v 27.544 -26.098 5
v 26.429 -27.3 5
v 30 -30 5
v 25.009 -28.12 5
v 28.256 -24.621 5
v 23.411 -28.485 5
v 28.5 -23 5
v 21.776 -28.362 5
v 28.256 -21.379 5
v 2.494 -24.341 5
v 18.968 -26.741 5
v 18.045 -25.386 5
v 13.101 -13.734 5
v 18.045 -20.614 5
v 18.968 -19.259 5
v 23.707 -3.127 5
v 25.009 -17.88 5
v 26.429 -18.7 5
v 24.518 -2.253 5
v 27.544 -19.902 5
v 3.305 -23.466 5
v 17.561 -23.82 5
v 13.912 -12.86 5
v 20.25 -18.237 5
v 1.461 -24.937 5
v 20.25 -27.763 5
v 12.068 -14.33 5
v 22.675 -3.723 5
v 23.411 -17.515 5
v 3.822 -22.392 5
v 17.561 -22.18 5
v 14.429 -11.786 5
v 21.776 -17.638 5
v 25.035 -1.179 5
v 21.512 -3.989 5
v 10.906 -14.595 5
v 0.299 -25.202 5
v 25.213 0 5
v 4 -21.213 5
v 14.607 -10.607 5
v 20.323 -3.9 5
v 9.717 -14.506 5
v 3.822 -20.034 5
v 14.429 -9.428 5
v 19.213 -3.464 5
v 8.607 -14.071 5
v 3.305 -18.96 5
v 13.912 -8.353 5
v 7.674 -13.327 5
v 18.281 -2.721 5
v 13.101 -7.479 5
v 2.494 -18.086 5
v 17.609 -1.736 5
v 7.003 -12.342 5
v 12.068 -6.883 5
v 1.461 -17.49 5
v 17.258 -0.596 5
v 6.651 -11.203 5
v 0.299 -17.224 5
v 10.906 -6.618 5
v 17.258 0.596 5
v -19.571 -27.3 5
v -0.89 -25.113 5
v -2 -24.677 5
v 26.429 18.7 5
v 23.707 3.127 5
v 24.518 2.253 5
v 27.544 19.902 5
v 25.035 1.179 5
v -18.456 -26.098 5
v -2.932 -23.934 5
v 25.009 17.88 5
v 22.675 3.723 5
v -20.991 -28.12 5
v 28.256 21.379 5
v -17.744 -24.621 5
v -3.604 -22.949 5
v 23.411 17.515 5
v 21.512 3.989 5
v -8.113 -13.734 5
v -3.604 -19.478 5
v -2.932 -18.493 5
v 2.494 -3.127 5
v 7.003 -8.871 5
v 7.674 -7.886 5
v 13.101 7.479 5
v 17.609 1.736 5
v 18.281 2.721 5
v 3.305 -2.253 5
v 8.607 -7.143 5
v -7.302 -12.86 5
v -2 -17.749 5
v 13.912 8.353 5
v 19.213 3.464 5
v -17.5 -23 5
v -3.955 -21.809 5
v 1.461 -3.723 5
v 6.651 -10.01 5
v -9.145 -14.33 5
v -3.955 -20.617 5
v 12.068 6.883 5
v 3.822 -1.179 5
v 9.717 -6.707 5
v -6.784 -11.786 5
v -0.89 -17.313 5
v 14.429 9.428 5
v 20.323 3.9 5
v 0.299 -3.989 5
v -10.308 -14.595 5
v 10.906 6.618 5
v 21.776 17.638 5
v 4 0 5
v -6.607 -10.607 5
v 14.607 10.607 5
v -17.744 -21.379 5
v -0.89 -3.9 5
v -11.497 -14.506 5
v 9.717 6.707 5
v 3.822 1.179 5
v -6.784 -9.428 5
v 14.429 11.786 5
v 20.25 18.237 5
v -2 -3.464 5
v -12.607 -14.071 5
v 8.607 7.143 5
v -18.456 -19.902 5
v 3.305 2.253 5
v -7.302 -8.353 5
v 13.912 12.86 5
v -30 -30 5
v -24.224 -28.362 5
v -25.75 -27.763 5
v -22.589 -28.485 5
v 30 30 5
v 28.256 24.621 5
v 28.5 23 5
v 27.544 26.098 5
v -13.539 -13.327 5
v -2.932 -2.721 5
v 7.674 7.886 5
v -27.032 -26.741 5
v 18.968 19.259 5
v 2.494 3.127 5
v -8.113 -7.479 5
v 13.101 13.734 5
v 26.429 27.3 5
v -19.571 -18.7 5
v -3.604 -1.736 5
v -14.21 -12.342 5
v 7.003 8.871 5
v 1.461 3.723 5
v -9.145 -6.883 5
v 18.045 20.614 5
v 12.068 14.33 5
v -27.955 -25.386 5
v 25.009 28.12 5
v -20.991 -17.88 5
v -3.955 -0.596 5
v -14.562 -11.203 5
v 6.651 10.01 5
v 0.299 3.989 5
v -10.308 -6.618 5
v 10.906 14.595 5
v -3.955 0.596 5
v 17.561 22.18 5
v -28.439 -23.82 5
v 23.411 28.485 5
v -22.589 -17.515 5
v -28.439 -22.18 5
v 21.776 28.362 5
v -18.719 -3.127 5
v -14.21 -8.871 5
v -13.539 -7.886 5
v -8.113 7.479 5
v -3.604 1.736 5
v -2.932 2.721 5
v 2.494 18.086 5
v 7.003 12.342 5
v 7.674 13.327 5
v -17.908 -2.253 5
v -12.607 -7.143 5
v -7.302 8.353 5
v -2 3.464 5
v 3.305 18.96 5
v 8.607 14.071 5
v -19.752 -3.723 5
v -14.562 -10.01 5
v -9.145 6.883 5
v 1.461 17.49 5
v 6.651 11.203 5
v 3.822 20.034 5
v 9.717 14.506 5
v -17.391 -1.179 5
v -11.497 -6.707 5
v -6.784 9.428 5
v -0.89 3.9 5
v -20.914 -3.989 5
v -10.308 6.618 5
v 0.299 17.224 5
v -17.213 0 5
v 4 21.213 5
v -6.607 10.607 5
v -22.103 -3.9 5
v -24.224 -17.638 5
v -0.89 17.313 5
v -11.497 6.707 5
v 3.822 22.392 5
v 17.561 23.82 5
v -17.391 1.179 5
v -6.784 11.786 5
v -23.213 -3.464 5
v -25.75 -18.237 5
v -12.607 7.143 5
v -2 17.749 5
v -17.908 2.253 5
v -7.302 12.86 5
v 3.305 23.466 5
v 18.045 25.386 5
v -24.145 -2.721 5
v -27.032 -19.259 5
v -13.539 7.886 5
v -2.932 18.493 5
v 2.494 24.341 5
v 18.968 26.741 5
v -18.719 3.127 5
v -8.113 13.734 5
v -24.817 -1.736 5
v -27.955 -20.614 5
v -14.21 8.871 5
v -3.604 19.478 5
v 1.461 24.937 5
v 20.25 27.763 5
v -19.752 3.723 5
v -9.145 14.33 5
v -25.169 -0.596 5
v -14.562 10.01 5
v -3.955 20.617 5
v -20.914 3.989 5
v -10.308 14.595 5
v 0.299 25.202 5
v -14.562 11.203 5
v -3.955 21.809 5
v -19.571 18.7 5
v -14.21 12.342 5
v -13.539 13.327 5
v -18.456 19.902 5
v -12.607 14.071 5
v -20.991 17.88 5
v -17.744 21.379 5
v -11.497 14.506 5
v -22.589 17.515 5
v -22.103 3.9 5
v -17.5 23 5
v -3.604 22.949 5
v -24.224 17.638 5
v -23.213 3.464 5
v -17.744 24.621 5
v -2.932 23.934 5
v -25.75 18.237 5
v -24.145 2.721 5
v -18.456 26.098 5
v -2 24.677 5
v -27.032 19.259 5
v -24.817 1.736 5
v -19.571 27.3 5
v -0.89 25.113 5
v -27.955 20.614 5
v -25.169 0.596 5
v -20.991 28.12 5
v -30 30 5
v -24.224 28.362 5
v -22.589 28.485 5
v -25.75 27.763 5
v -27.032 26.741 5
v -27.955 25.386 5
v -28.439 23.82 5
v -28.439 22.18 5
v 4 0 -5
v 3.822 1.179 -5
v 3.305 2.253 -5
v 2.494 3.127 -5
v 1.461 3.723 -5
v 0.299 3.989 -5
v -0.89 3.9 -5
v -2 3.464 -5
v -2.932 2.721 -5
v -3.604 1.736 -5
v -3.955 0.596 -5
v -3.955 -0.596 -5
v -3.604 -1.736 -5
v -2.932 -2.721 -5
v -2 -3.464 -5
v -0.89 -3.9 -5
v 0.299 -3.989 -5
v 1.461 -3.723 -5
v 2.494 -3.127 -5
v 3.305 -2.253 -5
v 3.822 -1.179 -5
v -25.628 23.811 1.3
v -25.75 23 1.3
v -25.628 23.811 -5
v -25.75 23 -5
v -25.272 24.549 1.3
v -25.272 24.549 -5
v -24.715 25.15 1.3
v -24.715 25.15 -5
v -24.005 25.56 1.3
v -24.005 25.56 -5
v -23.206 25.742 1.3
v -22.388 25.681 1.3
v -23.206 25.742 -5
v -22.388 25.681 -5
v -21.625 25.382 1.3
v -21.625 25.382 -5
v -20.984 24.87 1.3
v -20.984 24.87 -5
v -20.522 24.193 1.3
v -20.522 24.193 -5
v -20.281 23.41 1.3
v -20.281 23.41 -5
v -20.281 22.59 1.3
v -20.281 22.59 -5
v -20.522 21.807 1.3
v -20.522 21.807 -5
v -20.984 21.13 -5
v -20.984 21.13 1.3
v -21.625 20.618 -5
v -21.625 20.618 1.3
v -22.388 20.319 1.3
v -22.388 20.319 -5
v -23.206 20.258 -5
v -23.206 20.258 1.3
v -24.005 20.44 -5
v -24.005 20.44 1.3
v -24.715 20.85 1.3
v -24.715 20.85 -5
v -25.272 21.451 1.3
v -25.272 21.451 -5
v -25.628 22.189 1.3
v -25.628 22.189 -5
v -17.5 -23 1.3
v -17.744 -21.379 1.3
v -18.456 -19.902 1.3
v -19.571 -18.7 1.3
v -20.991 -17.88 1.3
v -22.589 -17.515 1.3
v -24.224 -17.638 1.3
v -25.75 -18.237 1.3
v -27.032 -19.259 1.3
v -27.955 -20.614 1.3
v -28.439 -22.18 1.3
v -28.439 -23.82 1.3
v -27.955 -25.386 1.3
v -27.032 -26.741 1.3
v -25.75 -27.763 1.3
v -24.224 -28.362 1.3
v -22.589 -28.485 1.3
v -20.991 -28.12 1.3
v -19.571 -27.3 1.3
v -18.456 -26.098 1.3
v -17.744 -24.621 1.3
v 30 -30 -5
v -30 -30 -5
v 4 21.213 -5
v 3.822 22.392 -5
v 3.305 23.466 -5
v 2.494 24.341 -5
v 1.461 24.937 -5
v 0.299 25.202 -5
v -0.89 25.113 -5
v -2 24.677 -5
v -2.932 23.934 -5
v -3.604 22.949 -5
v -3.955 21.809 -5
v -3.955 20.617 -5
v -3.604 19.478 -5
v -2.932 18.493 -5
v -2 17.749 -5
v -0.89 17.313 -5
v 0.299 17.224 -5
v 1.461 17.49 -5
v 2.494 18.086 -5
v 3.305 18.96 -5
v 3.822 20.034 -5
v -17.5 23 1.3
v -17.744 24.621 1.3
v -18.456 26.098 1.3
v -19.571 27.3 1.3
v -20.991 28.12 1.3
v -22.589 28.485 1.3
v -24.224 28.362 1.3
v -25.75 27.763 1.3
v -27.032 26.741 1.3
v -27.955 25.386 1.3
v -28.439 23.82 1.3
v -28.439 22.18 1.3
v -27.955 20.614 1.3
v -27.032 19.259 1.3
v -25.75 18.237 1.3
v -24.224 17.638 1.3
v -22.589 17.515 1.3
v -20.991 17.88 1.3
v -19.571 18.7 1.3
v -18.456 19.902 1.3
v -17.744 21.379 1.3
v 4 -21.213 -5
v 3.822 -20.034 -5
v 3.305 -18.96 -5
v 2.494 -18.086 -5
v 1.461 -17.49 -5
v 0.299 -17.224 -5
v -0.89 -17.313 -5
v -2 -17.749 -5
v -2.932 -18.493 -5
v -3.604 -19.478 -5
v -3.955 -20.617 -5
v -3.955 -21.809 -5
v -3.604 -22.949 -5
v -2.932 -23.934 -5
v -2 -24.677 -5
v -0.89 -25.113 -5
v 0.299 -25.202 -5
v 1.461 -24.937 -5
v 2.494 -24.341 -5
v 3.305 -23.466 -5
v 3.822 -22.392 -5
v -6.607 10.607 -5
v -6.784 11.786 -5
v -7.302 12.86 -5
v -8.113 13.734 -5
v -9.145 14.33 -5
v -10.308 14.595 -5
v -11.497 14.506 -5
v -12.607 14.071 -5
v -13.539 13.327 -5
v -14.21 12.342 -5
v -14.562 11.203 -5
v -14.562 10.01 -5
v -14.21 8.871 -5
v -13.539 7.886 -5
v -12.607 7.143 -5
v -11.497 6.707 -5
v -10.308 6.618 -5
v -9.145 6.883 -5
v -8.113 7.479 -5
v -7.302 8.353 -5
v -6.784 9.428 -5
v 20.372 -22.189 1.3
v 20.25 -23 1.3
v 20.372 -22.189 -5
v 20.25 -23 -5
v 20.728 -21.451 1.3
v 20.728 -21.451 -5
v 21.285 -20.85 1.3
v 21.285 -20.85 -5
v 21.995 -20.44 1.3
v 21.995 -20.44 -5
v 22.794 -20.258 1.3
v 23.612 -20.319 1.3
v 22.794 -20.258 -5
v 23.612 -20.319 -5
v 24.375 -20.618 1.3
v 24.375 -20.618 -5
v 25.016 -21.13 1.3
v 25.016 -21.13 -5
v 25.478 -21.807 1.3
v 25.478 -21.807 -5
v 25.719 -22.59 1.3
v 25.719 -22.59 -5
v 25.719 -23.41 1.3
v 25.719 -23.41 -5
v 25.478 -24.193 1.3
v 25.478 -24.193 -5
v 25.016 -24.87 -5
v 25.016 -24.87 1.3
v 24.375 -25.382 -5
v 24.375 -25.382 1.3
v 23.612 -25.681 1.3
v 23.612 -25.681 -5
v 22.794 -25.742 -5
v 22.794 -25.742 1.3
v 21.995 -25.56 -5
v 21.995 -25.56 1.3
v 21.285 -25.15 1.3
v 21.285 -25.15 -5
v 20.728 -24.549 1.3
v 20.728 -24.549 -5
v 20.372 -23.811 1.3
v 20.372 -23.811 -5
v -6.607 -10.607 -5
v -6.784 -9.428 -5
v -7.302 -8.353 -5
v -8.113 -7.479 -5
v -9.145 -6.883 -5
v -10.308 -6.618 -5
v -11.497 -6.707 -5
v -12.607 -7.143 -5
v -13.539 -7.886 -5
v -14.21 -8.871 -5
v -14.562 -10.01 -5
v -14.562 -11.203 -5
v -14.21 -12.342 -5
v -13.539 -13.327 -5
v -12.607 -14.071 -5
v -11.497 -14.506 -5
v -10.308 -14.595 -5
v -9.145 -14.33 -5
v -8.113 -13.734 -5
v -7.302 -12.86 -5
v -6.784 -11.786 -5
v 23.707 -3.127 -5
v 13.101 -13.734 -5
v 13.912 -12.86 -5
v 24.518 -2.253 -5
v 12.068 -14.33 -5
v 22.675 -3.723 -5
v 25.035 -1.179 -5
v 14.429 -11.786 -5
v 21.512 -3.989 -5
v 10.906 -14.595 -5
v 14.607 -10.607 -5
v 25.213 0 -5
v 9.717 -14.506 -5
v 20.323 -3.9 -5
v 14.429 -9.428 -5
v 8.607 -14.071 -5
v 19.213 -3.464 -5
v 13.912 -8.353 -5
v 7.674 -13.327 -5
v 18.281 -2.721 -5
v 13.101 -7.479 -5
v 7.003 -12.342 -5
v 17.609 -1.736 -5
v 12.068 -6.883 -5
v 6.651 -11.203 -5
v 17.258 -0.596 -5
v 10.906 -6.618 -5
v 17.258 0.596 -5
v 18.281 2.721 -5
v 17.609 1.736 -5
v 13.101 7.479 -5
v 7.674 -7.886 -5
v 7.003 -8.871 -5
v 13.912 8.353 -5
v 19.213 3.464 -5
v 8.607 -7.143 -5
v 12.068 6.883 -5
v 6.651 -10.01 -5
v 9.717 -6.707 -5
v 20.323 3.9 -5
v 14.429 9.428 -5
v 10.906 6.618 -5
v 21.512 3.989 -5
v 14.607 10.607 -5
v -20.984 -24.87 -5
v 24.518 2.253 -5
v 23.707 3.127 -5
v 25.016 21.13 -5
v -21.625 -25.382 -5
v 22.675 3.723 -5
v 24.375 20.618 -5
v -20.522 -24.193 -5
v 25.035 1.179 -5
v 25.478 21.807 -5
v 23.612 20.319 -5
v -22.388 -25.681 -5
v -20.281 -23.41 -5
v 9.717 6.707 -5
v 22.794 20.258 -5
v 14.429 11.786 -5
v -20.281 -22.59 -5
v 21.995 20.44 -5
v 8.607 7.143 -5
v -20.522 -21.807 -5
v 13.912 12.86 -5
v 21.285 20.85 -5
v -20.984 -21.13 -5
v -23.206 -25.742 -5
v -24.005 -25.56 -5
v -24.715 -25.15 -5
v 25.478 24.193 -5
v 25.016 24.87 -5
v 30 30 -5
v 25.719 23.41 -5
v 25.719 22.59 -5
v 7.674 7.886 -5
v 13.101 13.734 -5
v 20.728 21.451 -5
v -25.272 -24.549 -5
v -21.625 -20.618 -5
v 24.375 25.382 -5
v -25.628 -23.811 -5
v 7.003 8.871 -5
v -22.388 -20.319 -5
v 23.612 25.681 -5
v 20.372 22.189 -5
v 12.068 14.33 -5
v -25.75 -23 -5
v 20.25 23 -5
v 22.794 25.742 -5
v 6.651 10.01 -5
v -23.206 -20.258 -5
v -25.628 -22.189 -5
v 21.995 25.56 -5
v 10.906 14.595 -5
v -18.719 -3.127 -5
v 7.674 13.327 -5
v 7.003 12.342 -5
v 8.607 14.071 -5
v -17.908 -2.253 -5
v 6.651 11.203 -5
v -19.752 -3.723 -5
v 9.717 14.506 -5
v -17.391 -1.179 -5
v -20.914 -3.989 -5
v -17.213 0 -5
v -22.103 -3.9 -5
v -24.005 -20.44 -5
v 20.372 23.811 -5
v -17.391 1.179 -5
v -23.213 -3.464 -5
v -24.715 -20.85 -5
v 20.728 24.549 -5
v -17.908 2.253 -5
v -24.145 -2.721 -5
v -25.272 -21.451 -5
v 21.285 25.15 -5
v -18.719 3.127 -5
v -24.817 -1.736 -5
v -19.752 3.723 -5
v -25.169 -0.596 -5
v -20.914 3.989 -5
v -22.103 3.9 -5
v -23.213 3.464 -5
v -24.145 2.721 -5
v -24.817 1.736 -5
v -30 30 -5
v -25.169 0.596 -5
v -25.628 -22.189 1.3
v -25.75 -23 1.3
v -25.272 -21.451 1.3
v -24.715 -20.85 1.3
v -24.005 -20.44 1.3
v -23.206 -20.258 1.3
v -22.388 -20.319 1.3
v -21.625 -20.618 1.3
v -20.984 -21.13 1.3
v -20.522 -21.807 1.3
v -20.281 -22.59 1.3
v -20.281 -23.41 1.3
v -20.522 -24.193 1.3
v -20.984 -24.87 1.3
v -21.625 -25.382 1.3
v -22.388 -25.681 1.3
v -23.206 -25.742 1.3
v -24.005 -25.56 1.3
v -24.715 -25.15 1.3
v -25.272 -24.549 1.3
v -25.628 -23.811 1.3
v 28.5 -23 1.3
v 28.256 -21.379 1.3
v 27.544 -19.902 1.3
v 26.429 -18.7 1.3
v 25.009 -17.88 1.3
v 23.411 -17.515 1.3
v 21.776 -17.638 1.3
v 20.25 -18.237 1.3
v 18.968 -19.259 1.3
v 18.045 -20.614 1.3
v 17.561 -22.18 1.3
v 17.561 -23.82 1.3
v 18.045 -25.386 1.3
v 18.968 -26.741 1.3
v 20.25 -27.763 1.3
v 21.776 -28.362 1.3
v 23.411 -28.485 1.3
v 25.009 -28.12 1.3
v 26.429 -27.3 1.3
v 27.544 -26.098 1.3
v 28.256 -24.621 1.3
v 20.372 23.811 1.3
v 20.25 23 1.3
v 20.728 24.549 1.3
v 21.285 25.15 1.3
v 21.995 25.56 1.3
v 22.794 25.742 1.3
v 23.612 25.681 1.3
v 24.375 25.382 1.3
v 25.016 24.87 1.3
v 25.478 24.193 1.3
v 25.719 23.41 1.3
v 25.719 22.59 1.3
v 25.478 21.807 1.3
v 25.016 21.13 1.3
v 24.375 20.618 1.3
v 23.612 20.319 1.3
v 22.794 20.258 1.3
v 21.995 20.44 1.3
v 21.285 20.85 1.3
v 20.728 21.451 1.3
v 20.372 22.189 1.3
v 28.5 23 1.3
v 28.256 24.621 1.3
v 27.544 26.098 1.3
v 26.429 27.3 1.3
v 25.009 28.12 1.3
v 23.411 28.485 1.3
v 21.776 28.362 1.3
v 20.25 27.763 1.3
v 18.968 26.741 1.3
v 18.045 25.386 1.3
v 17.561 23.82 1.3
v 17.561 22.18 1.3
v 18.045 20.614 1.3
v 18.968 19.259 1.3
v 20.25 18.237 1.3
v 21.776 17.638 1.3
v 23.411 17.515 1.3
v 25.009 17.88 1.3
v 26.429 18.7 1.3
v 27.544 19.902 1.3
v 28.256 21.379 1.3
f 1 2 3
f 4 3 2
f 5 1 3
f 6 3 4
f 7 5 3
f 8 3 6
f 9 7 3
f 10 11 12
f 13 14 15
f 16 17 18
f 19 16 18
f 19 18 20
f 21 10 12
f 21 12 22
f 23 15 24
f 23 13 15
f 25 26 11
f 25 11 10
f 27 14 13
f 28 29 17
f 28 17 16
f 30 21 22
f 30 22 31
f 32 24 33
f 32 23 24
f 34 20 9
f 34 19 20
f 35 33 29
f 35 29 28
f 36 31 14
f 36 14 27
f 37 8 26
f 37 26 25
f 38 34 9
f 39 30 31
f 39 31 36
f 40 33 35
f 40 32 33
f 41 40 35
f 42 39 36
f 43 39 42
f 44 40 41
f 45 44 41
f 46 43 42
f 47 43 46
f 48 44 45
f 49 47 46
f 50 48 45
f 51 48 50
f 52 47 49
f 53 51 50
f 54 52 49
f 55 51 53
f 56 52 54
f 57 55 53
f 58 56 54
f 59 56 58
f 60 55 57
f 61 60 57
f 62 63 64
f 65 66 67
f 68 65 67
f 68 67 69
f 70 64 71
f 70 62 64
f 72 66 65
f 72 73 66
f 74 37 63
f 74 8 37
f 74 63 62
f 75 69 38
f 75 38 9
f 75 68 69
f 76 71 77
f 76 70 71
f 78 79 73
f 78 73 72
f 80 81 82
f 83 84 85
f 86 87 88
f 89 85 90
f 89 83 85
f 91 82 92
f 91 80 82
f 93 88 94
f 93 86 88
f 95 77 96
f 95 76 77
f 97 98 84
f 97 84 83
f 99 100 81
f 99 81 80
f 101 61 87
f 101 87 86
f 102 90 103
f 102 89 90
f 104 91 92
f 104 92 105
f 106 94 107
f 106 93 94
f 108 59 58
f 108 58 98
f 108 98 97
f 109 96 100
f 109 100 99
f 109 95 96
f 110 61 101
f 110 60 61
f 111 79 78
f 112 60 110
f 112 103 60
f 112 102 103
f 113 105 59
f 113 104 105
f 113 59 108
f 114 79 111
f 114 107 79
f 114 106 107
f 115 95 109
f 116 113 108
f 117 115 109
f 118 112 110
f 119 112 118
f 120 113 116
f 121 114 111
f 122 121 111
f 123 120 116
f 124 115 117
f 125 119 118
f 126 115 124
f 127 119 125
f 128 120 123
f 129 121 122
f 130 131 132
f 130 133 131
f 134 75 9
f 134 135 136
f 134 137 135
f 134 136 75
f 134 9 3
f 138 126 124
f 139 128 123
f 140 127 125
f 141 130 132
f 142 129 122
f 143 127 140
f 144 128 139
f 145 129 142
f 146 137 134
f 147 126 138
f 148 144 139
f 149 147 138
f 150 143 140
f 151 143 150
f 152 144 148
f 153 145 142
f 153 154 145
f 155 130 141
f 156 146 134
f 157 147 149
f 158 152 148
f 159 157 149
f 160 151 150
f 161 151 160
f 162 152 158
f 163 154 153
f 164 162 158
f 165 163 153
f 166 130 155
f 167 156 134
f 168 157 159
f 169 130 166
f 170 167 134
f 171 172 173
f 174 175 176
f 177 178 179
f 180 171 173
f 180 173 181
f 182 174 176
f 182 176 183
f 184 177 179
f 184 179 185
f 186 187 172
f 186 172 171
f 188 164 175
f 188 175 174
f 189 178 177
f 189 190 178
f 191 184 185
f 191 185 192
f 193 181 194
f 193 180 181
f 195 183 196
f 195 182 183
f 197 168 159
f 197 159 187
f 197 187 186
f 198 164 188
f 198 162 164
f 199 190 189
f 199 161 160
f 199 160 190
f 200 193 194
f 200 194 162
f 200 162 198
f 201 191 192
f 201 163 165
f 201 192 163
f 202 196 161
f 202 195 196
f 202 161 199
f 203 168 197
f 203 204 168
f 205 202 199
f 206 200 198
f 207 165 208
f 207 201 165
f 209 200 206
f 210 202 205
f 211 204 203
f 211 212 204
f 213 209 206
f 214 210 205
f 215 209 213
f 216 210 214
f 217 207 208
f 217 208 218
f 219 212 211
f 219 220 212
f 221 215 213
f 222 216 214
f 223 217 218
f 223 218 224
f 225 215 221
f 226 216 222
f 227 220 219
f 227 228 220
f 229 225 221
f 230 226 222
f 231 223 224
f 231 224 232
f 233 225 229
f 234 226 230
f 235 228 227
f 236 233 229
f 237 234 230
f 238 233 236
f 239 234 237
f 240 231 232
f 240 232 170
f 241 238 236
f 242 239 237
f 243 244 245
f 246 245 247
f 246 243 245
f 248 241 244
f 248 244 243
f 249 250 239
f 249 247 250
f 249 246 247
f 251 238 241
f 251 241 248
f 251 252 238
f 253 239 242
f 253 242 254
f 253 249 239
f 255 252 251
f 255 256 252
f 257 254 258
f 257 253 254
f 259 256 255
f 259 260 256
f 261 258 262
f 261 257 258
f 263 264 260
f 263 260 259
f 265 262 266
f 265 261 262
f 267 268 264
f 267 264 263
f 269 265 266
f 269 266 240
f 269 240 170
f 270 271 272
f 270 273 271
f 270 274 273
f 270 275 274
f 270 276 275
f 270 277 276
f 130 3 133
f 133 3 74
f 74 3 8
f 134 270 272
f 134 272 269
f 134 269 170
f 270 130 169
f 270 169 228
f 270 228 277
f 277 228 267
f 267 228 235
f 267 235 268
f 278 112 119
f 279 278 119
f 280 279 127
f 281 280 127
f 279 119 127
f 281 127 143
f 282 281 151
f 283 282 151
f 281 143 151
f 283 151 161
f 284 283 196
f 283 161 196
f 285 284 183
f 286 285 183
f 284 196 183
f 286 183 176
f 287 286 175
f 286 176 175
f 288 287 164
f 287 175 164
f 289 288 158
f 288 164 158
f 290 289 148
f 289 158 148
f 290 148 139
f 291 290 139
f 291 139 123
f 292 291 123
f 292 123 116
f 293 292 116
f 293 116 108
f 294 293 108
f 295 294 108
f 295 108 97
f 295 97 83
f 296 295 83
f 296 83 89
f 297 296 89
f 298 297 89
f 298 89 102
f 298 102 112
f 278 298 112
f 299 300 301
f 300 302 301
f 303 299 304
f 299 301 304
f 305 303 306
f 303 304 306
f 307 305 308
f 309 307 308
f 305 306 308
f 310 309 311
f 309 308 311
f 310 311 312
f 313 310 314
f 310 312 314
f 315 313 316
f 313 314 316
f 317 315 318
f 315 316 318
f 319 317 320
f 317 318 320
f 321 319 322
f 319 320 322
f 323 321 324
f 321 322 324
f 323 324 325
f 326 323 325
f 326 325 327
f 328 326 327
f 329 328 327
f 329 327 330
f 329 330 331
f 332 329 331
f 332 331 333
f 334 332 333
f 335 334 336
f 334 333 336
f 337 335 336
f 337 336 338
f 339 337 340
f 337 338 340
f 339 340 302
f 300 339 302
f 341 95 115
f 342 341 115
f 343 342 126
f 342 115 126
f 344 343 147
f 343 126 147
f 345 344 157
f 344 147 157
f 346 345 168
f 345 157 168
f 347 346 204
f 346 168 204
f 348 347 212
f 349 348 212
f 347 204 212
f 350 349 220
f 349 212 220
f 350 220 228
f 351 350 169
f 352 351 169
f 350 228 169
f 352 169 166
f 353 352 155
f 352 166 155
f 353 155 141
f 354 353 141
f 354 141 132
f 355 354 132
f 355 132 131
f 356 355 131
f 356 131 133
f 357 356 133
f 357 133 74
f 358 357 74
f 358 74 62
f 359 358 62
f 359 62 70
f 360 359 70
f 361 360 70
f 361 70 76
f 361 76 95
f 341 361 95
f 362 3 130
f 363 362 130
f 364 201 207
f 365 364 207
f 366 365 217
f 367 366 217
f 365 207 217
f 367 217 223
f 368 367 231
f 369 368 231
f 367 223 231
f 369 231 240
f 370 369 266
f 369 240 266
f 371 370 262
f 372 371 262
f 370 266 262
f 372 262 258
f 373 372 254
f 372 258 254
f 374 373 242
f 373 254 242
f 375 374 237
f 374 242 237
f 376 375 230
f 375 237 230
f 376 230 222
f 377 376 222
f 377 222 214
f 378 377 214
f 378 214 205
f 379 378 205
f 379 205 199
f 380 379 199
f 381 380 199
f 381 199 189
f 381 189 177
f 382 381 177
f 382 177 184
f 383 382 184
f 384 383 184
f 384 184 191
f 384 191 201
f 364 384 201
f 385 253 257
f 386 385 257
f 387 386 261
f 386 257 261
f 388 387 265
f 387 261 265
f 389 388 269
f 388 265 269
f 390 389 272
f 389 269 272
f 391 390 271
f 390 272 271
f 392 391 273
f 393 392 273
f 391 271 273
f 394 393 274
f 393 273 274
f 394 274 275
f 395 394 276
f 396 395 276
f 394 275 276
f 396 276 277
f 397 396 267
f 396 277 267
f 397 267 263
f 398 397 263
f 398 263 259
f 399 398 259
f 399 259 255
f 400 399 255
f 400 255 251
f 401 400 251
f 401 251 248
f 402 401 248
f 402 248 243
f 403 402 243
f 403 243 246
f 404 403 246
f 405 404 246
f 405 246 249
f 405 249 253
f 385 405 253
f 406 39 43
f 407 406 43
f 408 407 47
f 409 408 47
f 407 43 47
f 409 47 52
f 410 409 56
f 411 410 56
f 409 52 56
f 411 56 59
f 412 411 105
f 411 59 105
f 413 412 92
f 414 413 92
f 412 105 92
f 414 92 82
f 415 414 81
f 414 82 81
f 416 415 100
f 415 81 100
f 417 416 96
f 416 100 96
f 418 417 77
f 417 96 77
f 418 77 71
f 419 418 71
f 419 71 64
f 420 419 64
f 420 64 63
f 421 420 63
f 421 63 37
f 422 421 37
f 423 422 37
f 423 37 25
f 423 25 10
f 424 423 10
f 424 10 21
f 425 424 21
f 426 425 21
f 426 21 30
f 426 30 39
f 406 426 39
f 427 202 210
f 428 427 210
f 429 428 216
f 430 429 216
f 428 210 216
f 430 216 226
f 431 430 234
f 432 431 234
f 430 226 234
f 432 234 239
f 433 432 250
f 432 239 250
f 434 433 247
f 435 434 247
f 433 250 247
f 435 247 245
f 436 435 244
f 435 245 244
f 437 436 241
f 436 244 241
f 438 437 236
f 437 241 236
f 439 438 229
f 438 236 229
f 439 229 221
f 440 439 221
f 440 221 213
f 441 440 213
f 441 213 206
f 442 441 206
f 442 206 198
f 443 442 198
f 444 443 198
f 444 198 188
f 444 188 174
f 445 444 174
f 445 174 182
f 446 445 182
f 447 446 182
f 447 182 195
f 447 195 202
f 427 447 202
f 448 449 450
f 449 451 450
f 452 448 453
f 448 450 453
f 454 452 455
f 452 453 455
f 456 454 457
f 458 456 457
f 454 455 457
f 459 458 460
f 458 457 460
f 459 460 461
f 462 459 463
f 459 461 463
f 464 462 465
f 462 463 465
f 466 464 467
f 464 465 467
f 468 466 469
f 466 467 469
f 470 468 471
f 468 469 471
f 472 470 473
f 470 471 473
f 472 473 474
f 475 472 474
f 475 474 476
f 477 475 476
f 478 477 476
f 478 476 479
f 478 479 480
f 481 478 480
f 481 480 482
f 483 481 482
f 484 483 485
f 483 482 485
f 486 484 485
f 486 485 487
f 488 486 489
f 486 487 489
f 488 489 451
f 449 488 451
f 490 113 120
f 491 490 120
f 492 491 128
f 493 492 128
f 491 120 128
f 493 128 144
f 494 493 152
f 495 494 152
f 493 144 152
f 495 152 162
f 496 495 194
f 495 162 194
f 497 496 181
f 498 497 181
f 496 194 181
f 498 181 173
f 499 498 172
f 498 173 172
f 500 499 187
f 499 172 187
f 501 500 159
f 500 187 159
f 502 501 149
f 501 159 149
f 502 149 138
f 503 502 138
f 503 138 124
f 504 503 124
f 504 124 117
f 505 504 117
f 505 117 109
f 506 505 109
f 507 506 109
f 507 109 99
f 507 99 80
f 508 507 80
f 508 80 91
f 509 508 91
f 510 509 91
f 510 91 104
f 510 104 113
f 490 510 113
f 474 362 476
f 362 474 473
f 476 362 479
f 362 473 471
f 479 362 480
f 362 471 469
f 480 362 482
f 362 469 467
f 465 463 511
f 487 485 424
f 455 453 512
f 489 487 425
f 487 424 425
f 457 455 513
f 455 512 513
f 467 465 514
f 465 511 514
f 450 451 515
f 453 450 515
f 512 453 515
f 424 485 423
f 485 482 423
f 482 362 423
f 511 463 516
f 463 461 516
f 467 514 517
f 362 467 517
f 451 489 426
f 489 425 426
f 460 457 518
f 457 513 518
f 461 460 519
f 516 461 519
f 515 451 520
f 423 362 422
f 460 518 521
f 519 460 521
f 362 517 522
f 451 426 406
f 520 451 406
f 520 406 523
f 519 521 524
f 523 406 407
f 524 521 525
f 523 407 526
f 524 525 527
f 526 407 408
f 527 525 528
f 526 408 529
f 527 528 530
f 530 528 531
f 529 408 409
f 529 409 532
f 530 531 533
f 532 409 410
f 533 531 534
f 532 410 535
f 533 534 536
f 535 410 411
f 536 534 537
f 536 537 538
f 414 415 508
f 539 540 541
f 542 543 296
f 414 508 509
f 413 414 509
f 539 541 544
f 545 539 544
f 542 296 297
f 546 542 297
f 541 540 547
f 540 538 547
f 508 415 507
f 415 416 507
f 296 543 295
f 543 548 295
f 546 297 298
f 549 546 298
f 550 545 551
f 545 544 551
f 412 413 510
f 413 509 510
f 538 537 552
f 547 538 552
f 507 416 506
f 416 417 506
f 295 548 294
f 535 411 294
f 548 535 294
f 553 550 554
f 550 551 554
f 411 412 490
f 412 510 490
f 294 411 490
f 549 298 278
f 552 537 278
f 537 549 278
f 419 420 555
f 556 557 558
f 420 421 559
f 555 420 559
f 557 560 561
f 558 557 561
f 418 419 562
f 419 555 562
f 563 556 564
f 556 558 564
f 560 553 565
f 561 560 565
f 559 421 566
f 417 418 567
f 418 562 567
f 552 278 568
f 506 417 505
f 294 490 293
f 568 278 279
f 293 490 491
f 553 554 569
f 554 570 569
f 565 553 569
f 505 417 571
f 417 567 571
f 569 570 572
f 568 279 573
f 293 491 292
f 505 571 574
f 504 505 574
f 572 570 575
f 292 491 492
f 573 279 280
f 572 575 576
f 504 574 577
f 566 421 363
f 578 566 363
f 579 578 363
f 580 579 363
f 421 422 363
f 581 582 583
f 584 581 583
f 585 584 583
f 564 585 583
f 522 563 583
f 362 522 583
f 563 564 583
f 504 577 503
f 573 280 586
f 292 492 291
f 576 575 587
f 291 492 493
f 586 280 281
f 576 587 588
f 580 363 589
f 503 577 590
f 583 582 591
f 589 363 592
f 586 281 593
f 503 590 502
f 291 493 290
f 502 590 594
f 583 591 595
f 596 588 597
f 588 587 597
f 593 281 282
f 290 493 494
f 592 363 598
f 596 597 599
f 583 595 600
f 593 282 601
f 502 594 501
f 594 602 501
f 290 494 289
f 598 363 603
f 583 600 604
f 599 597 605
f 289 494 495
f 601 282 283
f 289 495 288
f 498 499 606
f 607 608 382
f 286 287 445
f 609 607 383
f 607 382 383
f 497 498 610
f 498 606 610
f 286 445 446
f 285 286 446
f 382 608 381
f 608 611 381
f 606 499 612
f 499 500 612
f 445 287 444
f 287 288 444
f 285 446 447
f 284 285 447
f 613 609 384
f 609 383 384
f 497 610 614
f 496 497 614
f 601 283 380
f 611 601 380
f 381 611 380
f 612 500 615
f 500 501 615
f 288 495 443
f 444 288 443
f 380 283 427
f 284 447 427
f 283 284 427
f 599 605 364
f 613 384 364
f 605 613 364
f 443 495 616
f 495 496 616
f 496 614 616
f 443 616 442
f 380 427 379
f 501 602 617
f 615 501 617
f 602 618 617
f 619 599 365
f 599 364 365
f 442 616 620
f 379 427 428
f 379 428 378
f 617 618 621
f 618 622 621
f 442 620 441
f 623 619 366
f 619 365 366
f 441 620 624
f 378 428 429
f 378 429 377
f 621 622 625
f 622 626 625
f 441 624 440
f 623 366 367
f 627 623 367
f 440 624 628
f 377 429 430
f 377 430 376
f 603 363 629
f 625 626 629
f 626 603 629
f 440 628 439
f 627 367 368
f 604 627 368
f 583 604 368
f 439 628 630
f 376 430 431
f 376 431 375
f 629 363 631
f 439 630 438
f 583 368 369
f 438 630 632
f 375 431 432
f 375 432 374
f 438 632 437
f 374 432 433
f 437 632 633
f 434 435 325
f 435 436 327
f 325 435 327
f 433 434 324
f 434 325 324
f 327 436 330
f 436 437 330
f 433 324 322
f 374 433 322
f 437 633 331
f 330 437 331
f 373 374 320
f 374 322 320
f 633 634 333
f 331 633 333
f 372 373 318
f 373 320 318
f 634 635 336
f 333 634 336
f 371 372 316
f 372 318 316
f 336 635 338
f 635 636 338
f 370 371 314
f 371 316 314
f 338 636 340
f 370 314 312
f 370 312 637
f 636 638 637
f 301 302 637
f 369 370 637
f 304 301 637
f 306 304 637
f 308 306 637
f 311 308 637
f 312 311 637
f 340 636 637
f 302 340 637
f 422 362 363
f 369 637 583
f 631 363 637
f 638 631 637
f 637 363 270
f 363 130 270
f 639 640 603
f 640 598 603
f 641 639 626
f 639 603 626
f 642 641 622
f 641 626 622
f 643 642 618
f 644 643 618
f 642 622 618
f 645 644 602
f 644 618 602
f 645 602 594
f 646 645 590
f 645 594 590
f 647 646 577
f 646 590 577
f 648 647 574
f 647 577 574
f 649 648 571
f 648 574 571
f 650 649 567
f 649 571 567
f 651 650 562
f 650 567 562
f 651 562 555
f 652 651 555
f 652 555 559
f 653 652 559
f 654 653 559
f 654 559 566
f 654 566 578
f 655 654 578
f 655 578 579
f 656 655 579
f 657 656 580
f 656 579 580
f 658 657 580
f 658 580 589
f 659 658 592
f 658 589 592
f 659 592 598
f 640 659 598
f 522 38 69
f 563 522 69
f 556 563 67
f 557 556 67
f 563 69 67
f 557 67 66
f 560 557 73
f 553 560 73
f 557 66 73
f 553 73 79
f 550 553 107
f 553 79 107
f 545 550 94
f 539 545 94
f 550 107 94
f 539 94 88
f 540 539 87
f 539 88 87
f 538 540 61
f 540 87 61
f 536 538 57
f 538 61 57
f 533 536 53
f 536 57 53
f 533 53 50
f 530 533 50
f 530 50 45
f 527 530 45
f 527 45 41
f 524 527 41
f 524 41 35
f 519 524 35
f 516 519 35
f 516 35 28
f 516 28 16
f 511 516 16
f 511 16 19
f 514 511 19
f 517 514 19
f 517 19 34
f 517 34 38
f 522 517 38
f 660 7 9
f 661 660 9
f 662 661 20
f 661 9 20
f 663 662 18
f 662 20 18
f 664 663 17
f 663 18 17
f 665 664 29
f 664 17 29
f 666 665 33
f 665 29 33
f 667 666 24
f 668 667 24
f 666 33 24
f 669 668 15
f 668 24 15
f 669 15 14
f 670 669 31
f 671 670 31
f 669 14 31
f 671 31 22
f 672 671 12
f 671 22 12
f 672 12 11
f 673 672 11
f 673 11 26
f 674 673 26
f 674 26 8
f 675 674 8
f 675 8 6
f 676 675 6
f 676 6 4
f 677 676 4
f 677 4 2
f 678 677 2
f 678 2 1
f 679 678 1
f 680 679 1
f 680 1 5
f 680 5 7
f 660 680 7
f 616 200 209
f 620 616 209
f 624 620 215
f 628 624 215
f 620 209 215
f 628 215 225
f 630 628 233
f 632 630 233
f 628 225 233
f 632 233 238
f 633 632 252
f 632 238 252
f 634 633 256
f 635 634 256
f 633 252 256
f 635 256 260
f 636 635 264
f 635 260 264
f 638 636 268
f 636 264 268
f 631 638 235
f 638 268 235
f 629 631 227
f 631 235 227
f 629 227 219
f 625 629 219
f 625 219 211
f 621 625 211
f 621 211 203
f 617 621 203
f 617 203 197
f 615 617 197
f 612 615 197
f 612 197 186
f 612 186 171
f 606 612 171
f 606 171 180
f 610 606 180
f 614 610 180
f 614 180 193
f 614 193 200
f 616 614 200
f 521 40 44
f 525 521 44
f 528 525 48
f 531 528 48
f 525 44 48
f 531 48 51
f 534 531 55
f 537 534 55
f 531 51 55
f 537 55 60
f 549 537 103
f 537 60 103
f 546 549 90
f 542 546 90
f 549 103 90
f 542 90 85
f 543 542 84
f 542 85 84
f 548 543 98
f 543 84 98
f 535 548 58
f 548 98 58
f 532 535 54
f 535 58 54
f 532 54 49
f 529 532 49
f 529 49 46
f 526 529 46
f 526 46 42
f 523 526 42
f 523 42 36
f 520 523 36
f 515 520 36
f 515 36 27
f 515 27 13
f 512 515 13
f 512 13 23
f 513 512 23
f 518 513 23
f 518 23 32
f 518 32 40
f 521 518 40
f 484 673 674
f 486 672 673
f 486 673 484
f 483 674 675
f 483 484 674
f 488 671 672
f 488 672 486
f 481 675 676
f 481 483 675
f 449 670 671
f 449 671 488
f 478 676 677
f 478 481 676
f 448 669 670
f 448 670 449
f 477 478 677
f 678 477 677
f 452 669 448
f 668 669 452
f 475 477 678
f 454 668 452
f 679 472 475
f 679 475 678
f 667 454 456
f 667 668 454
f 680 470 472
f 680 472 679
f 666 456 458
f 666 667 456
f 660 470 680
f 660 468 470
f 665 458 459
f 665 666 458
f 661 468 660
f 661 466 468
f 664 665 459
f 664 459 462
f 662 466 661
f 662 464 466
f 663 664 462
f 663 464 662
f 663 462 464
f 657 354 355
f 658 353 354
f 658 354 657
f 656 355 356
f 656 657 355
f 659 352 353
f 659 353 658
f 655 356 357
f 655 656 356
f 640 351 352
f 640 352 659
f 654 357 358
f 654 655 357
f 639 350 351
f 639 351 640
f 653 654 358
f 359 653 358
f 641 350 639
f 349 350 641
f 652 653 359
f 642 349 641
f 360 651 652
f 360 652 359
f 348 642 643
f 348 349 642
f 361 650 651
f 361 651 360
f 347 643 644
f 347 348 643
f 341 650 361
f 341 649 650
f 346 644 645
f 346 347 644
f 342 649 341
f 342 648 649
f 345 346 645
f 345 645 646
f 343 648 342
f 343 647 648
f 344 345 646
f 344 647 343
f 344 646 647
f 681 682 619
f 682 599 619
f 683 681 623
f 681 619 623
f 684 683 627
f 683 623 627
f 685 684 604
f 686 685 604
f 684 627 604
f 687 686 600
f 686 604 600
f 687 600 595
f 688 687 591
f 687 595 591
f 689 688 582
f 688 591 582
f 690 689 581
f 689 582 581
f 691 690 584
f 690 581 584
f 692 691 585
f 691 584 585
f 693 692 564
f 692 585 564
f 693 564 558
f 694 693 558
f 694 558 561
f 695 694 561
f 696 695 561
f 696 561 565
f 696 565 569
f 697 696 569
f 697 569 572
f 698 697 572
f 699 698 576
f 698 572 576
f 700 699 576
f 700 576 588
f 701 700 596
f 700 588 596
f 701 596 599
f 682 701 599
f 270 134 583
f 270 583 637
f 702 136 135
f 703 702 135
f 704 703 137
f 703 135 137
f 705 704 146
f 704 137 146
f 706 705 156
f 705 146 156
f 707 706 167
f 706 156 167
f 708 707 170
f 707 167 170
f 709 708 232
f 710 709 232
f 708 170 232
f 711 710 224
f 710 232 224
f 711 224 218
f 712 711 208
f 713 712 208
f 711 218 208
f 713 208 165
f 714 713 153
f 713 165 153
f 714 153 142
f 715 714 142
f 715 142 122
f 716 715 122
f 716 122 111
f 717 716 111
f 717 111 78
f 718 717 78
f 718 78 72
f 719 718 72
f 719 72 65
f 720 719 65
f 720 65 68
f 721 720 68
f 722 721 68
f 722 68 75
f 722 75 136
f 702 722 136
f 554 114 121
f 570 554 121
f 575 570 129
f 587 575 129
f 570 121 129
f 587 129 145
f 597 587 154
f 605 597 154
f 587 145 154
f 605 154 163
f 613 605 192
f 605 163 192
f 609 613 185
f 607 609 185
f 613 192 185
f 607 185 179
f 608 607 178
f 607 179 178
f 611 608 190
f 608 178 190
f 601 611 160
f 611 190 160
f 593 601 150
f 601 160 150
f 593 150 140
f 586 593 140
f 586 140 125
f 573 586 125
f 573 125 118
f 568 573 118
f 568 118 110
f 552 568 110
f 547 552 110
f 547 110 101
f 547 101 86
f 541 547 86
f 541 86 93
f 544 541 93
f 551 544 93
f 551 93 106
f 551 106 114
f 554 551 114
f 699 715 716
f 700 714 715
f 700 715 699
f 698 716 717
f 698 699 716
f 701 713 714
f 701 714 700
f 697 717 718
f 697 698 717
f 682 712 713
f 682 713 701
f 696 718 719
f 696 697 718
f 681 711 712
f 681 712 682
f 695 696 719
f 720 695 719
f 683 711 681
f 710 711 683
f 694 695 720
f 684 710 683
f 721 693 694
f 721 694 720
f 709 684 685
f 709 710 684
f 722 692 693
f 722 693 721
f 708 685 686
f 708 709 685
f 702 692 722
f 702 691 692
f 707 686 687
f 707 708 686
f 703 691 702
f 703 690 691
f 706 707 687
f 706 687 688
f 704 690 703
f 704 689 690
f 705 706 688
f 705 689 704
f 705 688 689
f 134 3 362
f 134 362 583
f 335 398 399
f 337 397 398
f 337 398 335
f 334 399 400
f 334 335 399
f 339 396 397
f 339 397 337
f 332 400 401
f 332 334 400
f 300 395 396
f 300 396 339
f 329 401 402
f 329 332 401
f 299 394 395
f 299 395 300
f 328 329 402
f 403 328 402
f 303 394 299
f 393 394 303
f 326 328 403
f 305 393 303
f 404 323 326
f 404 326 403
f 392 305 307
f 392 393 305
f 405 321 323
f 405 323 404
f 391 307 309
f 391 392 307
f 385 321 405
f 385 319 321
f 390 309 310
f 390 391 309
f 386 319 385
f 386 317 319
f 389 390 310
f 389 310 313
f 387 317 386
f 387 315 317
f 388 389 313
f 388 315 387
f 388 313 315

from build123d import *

# Parameters (mm, degrees)
SKETCH1_W                                = 60
SKETCH1_H                                = 60
BOSS_EXTRUDE1_DEPTH                      = 5
SKETCH2_R                                = 4
CUT_EXTRUDE1_DEPTH                       = 44.588989435
LPATTERN1_COUNT                          = 3
LPATTERN1_PITCH                          = 15
LPATTERN1_COUNT_DIR2                     = 3
LPATTERN1_PITCH_DIR2                     = 15
CBORE_FOR_M5_PAN_HEAD_SCREW1_D           = 5.5
CBORE_FOR_M5_PAN_HEAD_SCREW1_CBORE_D     = 11
CBORE_FOR_M5_PAN_HEAD_SCREW1_CBORE_DEPTH = 3.7


with BuildPart() as part:
    # Sketch1 → Boss-Extrude1 (new, symmetric)
    with BuildSketch(Plane(origin=(0, 0, 0), x_dir=(0, 1, 0), z_dir=(0, 0, 1))):
        Rectangle(SKETCH1_W, SKETCH1_H)
    extrude(amount=BOSS_EXTRUDE1_DEPTH, both=True)

    # Sketch2 → Cut-Extrude1 (cut, through all)
    with BuildSketch(Plane.XY.offset(5)):
        with Locations((0, -21.213203436)):
            Circle(SKETCH2_R)
    cut_extrude1 = extrude(amount=-CUT_EXTRUDE1_DEPTH, mode=Mode.SUBTRACT)

    # LPattern1: Cut-Extrude1 3 × 3
    with Locations(*[Vector(0.7071067811865476, 0.7071067811865476, 0) * (i * LPATTERN1_PITCH) + Vector(-0.7071067811865476, 0.7071067811865476, 0) * (j * LPATTERN1_PITCH_DIR2) for i in range(LPATTERN1_COUNT) for j in range(LPATTERN1_COUNT_DIR2) if (i, j) != (0, 0)]):
        add(cut_extrude1, mode=Mode.SUBTRACT)

    # CBORE for M5 Pan Head Screw1 (through all)
    with Locations(Plane(origin=(-23, 23, 5), x_dir=(1, 0, 0), z_dir=(0, 0, 1))):
        with Locations((0, 0), (46, 0), (46, -46), (0, -46)):
            CounterBoreHole(CBORE_FOR_M5_PAN_HEAD_SCREW1_D / 2, CBORE_FOR_M5_PAN_HEAD_SCREW1_CBORE_D / 2, CBORE_FOR_M5_PAN_HEAD_SCREW1_CBORE_DEPTH)


solid = part.part
